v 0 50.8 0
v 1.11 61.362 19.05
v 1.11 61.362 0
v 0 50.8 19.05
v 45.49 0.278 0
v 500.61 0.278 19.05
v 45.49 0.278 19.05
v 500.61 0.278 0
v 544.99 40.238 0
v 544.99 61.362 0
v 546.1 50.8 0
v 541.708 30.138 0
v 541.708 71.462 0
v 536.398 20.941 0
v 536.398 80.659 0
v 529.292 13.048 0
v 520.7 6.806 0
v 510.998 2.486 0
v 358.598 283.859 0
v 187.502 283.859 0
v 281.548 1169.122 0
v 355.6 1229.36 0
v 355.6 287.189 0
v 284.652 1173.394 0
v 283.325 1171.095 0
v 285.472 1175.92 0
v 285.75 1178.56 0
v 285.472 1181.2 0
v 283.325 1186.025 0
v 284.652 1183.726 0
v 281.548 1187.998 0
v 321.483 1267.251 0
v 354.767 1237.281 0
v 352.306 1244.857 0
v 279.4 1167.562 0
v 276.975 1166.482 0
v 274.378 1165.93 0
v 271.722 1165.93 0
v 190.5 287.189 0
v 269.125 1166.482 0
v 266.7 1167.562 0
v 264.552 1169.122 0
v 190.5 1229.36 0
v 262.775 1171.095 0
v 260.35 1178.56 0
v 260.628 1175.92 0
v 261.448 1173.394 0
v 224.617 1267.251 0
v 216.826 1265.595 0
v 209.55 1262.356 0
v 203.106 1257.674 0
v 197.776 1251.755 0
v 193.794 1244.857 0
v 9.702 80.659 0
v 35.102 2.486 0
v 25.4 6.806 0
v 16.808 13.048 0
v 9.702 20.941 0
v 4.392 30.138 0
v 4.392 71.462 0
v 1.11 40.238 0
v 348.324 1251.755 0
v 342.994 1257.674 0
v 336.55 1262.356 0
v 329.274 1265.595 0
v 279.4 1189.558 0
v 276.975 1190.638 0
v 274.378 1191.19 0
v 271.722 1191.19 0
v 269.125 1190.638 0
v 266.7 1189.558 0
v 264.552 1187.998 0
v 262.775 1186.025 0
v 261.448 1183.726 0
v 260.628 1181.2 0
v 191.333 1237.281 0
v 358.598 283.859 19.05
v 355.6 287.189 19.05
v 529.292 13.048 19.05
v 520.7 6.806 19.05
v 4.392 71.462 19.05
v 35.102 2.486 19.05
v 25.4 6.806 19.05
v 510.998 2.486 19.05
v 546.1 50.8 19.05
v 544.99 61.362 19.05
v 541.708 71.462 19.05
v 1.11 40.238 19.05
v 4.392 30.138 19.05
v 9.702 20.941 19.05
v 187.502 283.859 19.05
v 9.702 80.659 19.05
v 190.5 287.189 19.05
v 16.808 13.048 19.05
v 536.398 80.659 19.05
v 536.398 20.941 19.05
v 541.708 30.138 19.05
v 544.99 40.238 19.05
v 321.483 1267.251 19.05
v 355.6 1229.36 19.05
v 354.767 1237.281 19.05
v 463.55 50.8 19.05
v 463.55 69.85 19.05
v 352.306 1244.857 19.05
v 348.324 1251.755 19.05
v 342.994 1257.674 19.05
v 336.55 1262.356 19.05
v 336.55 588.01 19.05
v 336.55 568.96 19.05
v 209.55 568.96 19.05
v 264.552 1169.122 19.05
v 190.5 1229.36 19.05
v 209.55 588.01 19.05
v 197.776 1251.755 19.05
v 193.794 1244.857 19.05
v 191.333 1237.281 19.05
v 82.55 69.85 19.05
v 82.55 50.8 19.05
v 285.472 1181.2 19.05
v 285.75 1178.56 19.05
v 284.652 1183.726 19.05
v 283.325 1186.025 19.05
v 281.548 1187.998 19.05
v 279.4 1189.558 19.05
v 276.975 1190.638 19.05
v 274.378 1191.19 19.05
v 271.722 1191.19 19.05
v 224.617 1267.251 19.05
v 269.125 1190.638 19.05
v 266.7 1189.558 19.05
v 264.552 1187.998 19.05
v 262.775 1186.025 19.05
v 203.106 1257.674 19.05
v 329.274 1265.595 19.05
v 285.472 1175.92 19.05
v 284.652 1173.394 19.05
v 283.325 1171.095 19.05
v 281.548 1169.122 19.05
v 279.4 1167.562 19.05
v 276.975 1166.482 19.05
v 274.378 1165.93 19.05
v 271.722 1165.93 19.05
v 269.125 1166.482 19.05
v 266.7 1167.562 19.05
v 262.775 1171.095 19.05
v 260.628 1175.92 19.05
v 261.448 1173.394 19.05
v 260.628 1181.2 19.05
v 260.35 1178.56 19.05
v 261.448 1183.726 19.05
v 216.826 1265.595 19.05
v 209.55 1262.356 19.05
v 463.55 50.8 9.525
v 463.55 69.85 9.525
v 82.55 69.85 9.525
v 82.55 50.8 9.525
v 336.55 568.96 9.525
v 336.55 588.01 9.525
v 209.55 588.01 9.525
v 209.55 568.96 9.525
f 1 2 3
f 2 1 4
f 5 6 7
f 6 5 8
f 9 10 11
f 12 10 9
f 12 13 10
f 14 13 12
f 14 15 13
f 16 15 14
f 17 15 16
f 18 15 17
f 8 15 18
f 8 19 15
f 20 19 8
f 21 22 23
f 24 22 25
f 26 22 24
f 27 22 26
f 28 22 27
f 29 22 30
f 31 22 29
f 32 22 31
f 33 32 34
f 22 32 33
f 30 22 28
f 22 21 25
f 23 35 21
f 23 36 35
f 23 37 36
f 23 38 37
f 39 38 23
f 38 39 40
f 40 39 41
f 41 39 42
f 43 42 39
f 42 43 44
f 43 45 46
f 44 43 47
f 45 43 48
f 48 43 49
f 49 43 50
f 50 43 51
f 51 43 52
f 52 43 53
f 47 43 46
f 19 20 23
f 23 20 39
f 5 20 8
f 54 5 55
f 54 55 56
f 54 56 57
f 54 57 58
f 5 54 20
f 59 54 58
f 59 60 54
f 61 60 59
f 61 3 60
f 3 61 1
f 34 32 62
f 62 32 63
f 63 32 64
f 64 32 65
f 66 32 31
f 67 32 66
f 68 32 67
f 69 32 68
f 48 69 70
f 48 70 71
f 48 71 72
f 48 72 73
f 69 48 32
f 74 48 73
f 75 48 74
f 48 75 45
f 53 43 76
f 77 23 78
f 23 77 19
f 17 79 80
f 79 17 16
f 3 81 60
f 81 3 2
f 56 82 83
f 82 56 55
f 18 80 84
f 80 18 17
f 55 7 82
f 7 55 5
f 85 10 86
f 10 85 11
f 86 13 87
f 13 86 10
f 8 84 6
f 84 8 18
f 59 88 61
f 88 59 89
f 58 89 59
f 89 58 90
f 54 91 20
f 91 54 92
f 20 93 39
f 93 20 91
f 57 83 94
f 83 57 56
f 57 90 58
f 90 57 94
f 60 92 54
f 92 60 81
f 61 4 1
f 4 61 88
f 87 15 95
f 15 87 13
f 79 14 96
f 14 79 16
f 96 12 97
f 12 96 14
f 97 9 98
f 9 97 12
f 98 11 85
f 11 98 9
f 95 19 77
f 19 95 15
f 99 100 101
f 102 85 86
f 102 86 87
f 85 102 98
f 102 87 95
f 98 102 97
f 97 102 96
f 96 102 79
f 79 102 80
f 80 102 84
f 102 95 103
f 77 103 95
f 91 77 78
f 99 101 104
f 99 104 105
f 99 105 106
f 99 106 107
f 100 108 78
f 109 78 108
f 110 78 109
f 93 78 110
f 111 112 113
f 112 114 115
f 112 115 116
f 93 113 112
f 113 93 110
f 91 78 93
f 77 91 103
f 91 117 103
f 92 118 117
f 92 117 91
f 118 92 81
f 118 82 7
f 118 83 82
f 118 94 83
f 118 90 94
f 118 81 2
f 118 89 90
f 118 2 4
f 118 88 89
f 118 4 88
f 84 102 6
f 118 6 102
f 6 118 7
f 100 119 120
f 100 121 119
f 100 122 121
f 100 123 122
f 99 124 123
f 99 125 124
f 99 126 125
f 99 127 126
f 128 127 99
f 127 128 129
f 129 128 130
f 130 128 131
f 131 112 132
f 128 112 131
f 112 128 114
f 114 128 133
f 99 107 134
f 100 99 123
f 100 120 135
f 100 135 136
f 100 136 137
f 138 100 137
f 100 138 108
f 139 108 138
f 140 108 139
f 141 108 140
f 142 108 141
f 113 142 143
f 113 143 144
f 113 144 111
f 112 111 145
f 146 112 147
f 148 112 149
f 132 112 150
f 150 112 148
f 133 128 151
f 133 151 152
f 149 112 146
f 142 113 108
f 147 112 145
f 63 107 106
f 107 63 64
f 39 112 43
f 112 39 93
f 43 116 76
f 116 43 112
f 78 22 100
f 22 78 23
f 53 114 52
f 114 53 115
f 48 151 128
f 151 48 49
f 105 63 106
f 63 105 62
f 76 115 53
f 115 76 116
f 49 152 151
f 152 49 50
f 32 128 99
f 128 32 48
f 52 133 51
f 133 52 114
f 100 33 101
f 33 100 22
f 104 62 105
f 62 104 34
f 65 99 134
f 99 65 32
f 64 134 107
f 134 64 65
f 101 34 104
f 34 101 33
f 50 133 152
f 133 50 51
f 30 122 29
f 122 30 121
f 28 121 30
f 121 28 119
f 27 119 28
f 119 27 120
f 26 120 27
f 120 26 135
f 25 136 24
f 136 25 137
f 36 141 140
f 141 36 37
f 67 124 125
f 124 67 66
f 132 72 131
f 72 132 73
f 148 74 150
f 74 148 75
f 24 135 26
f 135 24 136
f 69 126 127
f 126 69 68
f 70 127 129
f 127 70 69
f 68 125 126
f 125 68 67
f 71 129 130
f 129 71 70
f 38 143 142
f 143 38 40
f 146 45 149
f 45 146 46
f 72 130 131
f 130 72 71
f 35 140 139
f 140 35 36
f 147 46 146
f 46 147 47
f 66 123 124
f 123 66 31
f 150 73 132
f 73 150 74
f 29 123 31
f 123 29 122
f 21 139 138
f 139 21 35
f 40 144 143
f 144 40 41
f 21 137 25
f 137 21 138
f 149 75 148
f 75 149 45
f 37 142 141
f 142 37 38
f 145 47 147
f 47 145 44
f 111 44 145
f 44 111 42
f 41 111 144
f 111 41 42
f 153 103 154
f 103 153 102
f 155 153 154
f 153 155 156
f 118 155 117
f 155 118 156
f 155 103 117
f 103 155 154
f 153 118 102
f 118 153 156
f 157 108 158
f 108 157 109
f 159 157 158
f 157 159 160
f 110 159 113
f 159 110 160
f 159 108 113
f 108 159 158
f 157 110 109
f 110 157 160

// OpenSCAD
$inch = 25.4;

// Constants
$mat_thick = 0.75*$inch;

module vertical_side() {
    $r_base = 2*$inch;
    
    $l_foot_c2c = (21.5*$inch - (2*$r_base));
    $t_foot_c2c_factor = 0.4;
    $foot_vertical = 8 * $inch;
    
    $r_riser = 1.5*$inch;
    $riser_vertical = ($inch * 50);
    
    $riser_center_ll_x = $l_foot_c2c*$t_foot_c2c_factor;
    $riser_center_ll_y = $foot_vertical; 
    
    $riser_center_lr_x = $l_foot_c2c-($l_foot_c2c*$t_foot_c2c_factor);
    $riser_center_lr_y = $riser_center_ll_y;
    
    $riser_center_ul_x = $riser_center_ll_x;
    $riser_center_ul_y = $riser_vertical - 2.4*$r_riser;
    
    $riser_center_ur_x = $riser_center_lr_x;
    $riser_center_ur_y = $riser_center_ul_y;
    translate([$r_base, $r_base, 0]) {
        difference() {
            union() {
                hull() {
                    // left bottom corner
                    translate([0,0,0]) {
                        cylinder(r=$r_base, h=$mat_thick);
                    }
                    // right bottom corner
                    translate([$l_foot_c2c,0,0]) {
                        cylinder(r=$r_base, h=$mat_thick);
                    }
                    // left shoulder of base
                    translate([$l_foot_c2c*$t_foot_c2c_factor, $foot_vertical,0]) {
                        cylinder(r=$r_base, h=$mat_thick);
                    }
                    // right shoulder of base
                    translate([$l_foot_c2c-($l_foot_c2c*$t_foot_c2c_factor),$foot_vertical,0]) {
                        cylinder(r=$r_base, h=$mat_thick);
                    }
                }
                hull() {
                    // bottom left corner of upright
                    translate([$riser_center_ll_x,$riser_center_ll_y,0]) {
                        cylinder(r=$r_riser, h=$mat_thick);
                    }
                    // bottom right corner of upright
                    translate([$riser_center_lr_x,$riser_center_lr_y,0]) {
                        cylinder(r=$r_riser, h=$mat_thick);
                    }
                    // top left corner of upright
                    translate([$riser_center_ul_x,$riser_center_ul_y,0]) {
                        cylinder(r=$r_riser, h=$mat_thick);
                    }
                    
                    // top right corner of upright
                    translate([$riser_center_ur_x,$riser_center_ur_y,0]) {
                        cylinder(r=$r_riser, h=$mat_thick);
                    }            
                }
            }
    
            // start subtracting
            $r_pivot = 0.5*$inch;
            $center = (($riser_center_ur_x-$riser_center_ul_x)/2);
            translate([$riser_center_ul_x+$center,
                       $riser_center_ul_y-(2*$inch),
                        -0.1]) {
                cylinder(r=$r_pivot, h=$inch);
            }
            $slot_len = 15 * $inch;
            $center_slot = ($l_foot_c2c/2 - $slot_len/2);
            translate([$center_slot,0,$inch*3/8]) {
                cube([$inch*15,$inch*0.75,$inch*3/8+10]);
            }
            
            $slot2_len = $inch * 5;
            $slot2_center_start = $riser_center_ul_x +
                                  $center - $slot2_len/2;
            translate([$slot2_center_start,
                       $riser_center_ul_y-(26*$inch),
                       $inch*3/8]) {
                cube([$slot2_len,$inch*0.75,$inch*3/8+10]);
            }
            // still subtracting
        }
    }
}

module top_brace() {
    
}

module lower_brace() {
    
}

module wheel_mount() {
    
}

module make_structure() {
    vertical_side();

    //cube([100, 74.5 * $inch, 10]);
    // cube([30*$inch, 50*$inch, 1]);
}

module make_cut_layout() {
}

$2d = 0;
$flat = 0;
if ($2d) {
    projection(cut=true) {
       translate([0,0,0]) rotate([0,0,0]) {
         make_cut_layout();
       }
}
} else {
    if($flat) {
        make_cut_layout();
    } else {
        make_structure();
    }
//  for measuring and calibrating
//    translate([60,40,0]) {
//      cube([20,5,1]);
//    }
}
